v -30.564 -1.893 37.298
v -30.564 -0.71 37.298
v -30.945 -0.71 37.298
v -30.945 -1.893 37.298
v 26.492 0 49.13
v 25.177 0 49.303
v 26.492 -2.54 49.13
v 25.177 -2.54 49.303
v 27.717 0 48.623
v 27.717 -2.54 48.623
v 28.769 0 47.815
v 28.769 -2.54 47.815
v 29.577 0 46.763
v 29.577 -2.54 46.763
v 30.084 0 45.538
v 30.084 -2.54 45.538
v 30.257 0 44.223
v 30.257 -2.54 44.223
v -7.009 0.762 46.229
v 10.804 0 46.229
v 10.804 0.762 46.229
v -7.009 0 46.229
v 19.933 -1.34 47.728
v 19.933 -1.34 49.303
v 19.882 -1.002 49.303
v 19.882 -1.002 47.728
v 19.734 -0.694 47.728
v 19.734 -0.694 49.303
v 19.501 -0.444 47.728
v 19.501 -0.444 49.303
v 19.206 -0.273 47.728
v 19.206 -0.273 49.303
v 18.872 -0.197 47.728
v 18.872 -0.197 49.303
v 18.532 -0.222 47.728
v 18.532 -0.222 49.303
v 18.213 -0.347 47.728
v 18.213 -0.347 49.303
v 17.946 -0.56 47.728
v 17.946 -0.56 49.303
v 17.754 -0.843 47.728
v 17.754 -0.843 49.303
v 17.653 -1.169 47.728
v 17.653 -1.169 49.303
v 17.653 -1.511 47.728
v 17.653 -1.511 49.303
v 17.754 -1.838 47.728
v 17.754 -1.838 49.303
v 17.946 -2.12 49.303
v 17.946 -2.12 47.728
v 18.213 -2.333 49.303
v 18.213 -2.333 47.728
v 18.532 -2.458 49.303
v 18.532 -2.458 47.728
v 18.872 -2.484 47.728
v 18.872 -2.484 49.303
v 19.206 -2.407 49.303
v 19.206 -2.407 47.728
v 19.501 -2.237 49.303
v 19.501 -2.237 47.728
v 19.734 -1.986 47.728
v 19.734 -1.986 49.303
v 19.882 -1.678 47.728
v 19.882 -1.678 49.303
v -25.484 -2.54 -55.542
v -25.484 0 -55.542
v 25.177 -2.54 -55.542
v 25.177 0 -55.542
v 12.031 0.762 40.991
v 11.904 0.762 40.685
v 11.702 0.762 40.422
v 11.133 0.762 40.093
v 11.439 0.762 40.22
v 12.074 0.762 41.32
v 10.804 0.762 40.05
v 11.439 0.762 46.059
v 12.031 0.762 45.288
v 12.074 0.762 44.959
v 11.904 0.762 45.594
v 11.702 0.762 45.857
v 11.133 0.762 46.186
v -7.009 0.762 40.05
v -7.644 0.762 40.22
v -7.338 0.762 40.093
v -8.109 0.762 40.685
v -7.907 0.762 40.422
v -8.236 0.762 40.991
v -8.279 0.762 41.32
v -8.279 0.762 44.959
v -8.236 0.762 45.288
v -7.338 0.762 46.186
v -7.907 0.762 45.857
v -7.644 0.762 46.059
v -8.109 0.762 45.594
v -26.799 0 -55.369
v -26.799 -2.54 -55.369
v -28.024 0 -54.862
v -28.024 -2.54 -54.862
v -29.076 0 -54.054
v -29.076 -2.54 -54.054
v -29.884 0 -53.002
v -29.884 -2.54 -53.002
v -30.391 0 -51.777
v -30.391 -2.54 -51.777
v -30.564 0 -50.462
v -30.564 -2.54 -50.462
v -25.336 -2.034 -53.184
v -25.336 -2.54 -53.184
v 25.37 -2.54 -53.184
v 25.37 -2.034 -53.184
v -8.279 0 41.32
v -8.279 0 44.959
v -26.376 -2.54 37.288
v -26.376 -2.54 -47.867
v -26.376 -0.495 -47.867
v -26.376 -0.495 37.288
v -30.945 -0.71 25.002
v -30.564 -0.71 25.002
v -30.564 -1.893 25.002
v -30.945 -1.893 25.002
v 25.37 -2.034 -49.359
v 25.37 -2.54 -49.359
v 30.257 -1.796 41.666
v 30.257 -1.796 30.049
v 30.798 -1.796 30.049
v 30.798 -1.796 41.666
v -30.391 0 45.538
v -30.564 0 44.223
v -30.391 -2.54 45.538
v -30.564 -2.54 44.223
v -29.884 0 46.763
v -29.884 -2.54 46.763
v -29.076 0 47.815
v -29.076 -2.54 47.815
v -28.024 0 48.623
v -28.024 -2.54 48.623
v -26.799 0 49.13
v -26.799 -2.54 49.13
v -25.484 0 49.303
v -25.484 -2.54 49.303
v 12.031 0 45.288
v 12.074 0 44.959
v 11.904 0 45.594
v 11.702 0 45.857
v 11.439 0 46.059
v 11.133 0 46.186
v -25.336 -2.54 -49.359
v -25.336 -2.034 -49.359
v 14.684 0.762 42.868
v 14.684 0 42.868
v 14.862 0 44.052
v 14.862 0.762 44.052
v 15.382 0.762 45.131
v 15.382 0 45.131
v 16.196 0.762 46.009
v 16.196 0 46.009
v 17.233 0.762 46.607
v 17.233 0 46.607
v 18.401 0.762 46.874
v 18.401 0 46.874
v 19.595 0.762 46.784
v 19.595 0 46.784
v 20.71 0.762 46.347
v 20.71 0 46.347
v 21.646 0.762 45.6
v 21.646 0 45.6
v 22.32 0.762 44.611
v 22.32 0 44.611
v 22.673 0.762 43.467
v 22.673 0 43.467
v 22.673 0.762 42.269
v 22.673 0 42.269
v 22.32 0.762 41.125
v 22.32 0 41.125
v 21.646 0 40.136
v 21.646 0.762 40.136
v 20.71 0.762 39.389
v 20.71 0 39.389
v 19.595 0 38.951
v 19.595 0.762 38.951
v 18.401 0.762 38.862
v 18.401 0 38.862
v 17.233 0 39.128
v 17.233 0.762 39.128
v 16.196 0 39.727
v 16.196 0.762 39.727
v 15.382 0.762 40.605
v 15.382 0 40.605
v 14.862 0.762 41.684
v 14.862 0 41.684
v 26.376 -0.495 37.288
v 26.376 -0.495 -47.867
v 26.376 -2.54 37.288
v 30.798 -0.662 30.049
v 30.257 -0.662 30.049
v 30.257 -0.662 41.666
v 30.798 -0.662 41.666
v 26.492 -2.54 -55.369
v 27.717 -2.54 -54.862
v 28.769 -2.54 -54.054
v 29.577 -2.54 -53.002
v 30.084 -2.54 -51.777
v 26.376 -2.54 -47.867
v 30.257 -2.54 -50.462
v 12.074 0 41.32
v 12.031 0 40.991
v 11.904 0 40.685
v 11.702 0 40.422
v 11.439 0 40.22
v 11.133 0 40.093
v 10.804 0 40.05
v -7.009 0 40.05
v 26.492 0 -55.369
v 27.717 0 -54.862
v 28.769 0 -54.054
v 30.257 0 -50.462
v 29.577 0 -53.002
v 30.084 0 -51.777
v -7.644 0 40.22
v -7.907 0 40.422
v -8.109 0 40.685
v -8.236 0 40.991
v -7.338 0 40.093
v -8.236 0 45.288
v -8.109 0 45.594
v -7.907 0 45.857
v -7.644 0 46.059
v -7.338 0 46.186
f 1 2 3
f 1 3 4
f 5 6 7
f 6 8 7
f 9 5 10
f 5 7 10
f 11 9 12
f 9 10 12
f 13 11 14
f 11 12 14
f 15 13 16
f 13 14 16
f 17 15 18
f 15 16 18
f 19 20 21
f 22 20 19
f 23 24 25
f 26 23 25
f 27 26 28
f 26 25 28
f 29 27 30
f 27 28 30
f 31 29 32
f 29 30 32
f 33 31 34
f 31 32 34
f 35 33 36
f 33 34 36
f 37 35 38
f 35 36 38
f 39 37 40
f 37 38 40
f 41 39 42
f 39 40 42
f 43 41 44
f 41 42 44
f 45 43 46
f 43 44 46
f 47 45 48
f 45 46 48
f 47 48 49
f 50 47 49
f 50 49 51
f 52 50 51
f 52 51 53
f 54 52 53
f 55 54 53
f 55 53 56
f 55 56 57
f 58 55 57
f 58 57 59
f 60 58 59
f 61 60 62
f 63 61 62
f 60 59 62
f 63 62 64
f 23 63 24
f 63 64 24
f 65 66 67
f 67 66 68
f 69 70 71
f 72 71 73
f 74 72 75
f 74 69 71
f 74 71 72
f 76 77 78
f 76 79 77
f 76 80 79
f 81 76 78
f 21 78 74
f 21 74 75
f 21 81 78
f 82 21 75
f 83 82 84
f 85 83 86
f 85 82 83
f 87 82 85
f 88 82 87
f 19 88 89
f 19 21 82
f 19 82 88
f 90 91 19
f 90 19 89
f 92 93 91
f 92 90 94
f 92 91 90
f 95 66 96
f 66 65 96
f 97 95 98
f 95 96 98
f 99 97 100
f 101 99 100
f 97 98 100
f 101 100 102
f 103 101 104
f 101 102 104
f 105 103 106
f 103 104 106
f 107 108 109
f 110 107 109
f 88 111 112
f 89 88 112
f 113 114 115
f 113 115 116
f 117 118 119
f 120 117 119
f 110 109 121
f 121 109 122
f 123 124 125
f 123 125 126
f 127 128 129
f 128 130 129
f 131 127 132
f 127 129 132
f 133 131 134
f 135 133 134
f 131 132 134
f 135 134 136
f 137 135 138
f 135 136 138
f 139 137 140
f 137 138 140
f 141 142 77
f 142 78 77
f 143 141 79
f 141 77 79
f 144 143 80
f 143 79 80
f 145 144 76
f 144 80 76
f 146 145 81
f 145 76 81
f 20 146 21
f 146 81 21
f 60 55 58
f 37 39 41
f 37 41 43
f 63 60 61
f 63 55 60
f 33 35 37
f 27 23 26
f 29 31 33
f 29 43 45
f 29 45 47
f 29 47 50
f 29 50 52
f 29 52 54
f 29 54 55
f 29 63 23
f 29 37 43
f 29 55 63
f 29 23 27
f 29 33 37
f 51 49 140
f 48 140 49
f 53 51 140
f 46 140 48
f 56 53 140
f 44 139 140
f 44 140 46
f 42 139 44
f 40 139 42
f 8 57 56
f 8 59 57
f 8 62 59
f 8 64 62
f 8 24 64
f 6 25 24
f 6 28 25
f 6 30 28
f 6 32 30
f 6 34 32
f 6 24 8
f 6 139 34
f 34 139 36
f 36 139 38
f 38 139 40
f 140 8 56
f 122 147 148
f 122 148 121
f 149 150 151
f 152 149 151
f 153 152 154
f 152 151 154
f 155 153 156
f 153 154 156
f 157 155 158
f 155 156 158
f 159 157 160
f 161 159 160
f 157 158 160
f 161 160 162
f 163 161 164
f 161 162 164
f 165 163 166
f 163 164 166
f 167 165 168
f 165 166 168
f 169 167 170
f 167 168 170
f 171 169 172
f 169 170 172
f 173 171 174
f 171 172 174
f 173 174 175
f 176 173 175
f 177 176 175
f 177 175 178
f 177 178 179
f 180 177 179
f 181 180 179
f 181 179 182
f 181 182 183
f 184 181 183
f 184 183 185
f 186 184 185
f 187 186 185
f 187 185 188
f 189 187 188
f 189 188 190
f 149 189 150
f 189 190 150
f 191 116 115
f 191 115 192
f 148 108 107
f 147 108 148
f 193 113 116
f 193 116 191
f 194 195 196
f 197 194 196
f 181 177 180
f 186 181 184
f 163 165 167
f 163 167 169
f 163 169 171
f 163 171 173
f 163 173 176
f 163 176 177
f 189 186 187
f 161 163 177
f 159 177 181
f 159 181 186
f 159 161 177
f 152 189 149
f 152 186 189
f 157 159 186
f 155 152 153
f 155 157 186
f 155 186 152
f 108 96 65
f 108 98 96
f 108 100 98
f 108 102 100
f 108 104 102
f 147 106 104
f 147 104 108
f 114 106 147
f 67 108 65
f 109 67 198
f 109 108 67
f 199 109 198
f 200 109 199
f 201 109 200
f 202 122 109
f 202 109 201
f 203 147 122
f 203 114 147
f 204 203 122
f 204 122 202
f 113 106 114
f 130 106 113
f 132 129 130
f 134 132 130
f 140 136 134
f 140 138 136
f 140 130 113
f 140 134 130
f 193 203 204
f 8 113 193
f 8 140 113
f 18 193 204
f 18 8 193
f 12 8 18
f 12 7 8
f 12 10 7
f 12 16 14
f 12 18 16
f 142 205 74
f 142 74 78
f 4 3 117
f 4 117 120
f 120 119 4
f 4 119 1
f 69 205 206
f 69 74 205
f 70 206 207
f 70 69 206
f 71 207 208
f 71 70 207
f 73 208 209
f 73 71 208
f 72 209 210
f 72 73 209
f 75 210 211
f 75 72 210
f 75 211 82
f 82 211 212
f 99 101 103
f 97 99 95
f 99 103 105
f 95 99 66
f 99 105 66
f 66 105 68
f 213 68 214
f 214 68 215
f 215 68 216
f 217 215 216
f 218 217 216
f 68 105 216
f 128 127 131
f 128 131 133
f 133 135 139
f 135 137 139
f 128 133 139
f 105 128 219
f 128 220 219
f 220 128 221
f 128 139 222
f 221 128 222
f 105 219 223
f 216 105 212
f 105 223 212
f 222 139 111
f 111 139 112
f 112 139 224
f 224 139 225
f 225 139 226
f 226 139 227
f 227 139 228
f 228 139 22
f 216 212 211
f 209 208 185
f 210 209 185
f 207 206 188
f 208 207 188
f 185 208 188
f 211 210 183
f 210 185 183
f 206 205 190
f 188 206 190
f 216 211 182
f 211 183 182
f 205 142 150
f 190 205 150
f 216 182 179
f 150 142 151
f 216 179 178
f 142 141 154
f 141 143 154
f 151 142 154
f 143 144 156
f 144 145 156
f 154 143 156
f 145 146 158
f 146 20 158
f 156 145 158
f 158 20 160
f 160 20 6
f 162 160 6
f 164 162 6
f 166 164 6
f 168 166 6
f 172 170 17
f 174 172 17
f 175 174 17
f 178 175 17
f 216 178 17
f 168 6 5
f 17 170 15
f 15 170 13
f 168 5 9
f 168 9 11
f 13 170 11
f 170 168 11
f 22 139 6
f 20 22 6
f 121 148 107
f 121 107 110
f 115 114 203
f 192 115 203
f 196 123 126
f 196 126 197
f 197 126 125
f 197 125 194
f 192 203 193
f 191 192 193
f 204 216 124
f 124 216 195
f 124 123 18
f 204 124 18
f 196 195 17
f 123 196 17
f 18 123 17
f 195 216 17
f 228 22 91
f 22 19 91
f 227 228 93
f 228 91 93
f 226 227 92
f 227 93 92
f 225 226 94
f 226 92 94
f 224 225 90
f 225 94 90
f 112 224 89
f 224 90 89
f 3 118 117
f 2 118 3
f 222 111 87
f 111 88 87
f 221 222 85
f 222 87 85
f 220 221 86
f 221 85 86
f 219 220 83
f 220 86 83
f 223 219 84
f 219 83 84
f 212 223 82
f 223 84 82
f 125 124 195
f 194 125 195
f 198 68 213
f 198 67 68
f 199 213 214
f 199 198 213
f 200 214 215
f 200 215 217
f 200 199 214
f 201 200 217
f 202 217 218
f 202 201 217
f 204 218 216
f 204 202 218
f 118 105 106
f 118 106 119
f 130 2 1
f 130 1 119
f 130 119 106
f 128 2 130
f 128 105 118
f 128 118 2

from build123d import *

# Parameters (mm, degrees)
F0_W      = 60.821578
F0_H      = 104.845289
F1_DEPTH  = 2.54
F2_R      = 5.08
F3_R      = 5.08
F4_R      = 5.08
F5_R      = 5.08
F6_R      = 4.017184
F7_DEPTH  = 0.762
F8_W      = 20.353574
F8_H      = 6.179251
F9_DEPTH  = 0.762
F10_R     = 1.27
F11_W     = 52.752584
F11_H     = 85.154727
F12_DEPTH = 2.045468
F13_W     = 50.705392
F13_H     = 3.825493
F14_DEPTH = 0.505788
F16_R     = 1.146481
F17_DEPTH = 1.574736
F19_W     = 1.183123
F19_H     = 12.295741
F20_DEPTH = 0.381
F21_W     = 1.133876
F21_H     = 11.616781
F22_DEPTH = 0.540292


with BuildPart() as f1:
    # F0 (on Front) → F1 (new body)
    with BuildSketch(Plane.XZ):
        with Locations((-0.1534, -3.119452)):
            Rectangle(F0_W, F0_H)
    extrude(amount=F1_DEPTH)

    # F2
    f2_edges = [f1.edges().sort_by_distance(p)[0] for p in [
        (30.257389, -1.27, -55.542096),
    ]]
    fillet(f2_edges, radius=F2_R)

    # F3
    f3_edges = [f1.edges().sort_by_distance(p)[0] for p in [
        (-30.564189, -1.27, -55.542096),
    ]]
    fillet(f3_edges, radius=F3_R)

    # F4
    f4_edges = [f1.edges().sort_by_distance(p)[0] for p in [
        (-30.564189, -1.27, 49.303193),
    ]]
    fillet(f4_edges, radius=F4_R)

    # F5
    f5_edges = [f1.edges().sort_by_distance(p)[0] for p in [
        (30.257389, -1.27, 49.303193),
    ]]
    fillet(f5_edges, radius=F5_R)

    # F6 (on face) → F7 (join)
    with BuildSketch(Plane(origin=(0, 0, 0), x_dir=(-1, 0, 0), z_dir=(0, 1, 0))):
        with Locations((-18.701095, 42.867944)):
            Circle(F6_R)
    extrude(amount=F7_DEPTH)

    # F8 (on face) → F9 (join)
    with BuildSketch(Plane(origin=(0, 0, 0), x_dir=(-1, 0, 0), z_dir=(0, 1, 0))):
        with Locations((-1.897635, 43.139625)):
            Rectangle(F8_W, F8_H)
    extrude(amount=F9_DEPTH)

    # F10
    f10_edges = [f1.edges().sort_by_distance(p)[0] for p in [
        (-8.279152, 0.381, 46.229251),
        (-8.279152, 0.381, 40.05),
        (12.074422, 0.381, 40.05),
        (12.074422, 0.381, 46.229251),
    ]]
    fillet(f10_edges, radius=F10_R)

    # F11 (on face) → F12 (cut)
    with BuildSketch(Plane.XZ.offset(2.54)):
        with Locations((0, -5.289763)):
            Rectangle(F11_W, F11_H)
    extrude(amount=-F12_DEPTH, mode=Mode.SUBTRACT)

    # F13 (on face) → F14 (cut)
    with BuildSketch(Plane.XZ.offset(2.54)):
        with Locations((0.016911, -51.271375)):
            Rectangle(F13_W, F13_H)
    extrude(amount=-F14_DEPTH, mode=Mode.SUBTRACT)

    # F16 (on face) → F17 (cut)
    with BuildSketch(Plane.XY.offset(49.303193)):
        with Locations((18.786654, -1.340227)):
            Circle(F16_R)
    extrude(amount=-F17_DEPTH, mode=Mode.SUBTRACT)

    # F19 (on face) → F20 (join)
    with BuildSketch(Plane(origin=(-30.564189, 0, 0), x_dir=(0, -1, 0), z_dir=(-1, 0, 0))):
        with Locations((1.301603, 31.14997)):
            Rectangle(F19_W, F19_H)
    extrude(amount=F20_DEPTH)

    # F21 (on face) → F22 (join)
    with BuildSketch(Plane.YZ.offset(30.257389)):
        with Locations((-1.228773, 35.857343)):
            Rectangle(F21_W, F21_H)
    extrude(amount=F22_DEPTH)


solid = f1.part
